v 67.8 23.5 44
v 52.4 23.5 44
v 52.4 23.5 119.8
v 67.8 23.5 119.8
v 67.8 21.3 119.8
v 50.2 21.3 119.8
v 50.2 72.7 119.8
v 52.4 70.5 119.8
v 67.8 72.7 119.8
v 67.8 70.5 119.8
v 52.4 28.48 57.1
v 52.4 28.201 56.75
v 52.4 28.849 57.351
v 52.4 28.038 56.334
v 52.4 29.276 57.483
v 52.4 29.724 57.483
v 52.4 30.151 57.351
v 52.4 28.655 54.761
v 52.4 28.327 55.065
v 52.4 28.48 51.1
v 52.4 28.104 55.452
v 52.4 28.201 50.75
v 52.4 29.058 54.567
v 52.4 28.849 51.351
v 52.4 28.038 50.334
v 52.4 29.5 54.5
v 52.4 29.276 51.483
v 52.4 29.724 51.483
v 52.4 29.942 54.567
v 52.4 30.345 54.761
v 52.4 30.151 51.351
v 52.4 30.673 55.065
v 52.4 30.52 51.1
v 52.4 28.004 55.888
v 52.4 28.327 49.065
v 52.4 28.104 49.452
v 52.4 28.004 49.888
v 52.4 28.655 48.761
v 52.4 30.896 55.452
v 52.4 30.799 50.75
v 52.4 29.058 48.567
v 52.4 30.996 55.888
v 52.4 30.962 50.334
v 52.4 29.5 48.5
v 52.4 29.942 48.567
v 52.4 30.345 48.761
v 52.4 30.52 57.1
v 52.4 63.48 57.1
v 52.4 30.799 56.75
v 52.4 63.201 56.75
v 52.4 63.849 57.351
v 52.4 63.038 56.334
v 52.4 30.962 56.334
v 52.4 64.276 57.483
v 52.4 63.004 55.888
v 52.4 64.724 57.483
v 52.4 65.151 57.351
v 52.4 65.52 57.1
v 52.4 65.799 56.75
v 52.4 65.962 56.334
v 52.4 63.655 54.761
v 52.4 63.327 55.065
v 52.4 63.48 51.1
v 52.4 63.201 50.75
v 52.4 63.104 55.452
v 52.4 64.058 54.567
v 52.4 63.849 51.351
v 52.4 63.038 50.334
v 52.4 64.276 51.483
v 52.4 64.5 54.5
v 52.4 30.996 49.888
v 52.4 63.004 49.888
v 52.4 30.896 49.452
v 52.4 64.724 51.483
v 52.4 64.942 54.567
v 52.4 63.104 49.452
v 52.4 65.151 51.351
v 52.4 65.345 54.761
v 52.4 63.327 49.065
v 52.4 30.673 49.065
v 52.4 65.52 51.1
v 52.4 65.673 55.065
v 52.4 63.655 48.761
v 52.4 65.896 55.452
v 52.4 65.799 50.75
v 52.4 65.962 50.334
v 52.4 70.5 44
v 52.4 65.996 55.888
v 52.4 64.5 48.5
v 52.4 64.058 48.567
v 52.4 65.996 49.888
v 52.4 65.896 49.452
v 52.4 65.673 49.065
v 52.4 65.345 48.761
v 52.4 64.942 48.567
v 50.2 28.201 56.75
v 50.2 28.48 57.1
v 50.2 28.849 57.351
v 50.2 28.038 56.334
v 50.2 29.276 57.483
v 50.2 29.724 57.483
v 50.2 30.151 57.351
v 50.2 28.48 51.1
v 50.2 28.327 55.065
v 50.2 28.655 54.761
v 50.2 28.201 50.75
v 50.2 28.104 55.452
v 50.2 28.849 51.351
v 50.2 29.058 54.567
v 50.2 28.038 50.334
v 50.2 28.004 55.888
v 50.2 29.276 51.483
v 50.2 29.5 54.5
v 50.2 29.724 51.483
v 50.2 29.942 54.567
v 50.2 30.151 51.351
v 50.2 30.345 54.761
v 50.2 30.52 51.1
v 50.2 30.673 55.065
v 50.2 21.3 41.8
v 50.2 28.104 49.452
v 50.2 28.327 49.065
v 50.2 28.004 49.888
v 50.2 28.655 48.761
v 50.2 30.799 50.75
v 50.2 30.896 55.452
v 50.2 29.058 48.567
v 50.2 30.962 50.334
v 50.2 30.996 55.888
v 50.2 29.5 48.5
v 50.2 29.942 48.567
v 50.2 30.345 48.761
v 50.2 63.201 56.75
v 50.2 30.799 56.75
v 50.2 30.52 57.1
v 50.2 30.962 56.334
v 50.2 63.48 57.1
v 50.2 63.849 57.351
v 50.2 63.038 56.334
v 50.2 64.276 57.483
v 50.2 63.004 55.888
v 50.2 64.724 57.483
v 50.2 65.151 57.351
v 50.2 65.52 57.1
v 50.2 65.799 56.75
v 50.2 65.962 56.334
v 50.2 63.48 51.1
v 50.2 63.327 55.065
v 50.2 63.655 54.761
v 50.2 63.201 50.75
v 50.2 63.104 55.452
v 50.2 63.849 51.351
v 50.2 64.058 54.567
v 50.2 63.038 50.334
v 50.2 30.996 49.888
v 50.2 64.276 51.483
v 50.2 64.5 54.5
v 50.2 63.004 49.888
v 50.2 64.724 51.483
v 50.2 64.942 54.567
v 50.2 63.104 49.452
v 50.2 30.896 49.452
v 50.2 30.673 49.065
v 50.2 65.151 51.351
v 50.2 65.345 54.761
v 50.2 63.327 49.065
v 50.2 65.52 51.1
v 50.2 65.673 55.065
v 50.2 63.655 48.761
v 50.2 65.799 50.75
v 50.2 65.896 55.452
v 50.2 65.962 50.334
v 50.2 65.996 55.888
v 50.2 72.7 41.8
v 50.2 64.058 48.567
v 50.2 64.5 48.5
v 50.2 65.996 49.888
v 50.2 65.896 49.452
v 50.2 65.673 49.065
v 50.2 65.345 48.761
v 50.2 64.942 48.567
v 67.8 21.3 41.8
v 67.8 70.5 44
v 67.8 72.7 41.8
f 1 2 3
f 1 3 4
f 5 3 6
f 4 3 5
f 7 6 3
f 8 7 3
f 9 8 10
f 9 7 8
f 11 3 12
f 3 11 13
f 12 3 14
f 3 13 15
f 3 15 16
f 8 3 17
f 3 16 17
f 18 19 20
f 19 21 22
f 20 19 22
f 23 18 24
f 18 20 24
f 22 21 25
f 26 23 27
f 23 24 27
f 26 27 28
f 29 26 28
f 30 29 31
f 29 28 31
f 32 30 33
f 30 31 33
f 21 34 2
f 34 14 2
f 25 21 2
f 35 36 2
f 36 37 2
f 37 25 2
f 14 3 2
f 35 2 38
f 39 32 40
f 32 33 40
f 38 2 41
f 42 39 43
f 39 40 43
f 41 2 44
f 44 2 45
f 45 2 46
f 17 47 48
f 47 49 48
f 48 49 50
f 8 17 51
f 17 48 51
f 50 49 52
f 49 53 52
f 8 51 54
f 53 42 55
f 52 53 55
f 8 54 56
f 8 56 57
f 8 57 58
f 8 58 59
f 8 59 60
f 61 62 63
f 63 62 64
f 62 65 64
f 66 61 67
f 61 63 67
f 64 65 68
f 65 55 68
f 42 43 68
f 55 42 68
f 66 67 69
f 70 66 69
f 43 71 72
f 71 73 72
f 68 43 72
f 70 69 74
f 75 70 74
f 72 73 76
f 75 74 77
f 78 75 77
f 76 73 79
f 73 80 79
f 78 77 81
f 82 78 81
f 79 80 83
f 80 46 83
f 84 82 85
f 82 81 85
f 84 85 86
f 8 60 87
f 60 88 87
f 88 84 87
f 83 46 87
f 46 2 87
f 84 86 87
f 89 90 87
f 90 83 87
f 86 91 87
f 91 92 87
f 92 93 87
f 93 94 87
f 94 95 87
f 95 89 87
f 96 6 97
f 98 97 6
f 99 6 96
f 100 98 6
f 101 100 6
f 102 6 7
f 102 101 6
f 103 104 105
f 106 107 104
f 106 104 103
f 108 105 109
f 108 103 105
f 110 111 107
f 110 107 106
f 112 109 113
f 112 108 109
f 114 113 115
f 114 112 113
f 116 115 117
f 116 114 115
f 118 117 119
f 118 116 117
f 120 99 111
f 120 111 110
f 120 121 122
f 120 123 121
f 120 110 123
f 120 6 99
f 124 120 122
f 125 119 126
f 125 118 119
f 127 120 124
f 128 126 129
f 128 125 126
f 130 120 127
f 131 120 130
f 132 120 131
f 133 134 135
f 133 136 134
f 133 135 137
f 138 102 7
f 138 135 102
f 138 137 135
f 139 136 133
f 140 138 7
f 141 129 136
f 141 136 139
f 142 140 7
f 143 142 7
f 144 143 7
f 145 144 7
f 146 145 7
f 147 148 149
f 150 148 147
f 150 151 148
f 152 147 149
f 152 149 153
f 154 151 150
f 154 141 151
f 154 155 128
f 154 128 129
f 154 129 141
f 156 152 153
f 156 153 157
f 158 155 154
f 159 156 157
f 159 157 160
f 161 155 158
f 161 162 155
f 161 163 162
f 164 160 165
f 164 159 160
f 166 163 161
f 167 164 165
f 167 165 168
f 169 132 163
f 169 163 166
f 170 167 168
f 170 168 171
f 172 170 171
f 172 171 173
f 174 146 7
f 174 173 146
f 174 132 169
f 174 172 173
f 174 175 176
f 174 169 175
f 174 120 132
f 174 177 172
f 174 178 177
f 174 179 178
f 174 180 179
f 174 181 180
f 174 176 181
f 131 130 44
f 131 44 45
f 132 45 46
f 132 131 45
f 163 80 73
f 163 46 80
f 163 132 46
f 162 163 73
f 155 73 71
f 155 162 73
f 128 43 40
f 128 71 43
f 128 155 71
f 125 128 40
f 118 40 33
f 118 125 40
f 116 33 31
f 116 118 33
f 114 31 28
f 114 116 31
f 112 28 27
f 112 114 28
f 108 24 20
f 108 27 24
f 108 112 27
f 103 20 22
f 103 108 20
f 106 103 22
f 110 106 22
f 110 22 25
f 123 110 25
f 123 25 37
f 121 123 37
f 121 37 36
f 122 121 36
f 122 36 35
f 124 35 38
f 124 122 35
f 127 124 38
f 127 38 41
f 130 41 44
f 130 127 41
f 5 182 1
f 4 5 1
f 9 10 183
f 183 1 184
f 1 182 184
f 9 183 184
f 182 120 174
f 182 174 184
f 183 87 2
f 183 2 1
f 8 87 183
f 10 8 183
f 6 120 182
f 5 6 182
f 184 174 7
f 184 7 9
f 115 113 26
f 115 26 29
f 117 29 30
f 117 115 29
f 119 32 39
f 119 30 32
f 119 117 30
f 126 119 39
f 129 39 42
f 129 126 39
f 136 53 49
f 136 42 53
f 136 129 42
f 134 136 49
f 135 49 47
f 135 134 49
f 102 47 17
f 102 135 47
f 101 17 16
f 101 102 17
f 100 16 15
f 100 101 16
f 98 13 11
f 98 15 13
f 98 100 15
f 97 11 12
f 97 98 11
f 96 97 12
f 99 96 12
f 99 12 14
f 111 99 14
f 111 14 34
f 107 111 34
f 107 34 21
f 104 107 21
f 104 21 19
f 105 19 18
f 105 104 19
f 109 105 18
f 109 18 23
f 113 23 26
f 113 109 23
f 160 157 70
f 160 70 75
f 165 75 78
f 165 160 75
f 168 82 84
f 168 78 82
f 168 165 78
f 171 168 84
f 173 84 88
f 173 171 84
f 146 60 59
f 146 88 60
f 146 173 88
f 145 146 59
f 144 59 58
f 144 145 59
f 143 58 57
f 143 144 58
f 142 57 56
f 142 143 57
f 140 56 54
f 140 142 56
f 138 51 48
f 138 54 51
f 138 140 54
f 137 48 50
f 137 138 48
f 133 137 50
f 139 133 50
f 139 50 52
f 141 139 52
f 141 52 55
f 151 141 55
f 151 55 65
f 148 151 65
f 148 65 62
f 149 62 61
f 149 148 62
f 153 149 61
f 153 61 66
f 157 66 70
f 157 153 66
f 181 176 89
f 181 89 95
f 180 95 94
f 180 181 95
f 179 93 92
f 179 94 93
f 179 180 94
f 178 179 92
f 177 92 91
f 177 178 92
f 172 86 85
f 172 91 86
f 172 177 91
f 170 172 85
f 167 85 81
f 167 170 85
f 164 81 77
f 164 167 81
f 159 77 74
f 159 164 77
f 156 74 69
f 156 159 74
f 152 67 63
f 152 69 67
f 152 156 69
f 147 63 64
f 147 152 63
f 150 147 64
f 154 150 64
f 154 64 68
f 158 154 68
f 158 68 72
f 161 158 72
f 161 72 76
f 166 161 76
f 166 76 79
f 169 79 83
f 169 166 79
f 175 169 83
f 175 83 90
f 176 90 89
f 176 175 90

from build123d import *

# Parameters (mm, degrees)
CYLINDER026_R     = 1.5
CYLINDER026_DEPTH = 10
CYLINDER025_R     = 1.5
CYLINDER025_DEPTH = 10
CYLINDER024_R     = 1.5
CYLINDER024_DEPTH = 10
CYLINDER027_R     = 1.5
CYLINDER027_DEPTH = 10
BOX022_W          = 15.4
BOX022_H          = 47
BOX022_DEPTH      = 75.8
BOX021_W          = 17.6
BOX021_H          = 51.4
BOX021_DEPTH      = 78


with BuildPart() as vs_schale_loch003:
    # Cylinder026 → Cylinder026 (new body)
    with BuildSketch(Plane(origin=(50, 64.5, 56), x_dir=(0, 0, -1), z_dir=(1, 0, 0))):
        Circle(CYLINDER026_R)
    extrude(amount=CYLINDER026_DEPTH)


with BuildPart() as vs_schale_loch002:
    # Cylinder025 → Cylinder025 (new body)
    with BuildSketch(Plane(origin=(50, 29.5, 50), x_dir=(0, 0, -1), z_dir=(1, 0, 0))):
        Circle(CYLINDER025_R)
    extrude(amount=CYLINDER025_DEPTH)


with BuildPart() as vs_schale_loch001:
    # Cylinder024 → Cylinder024 (new body)
    with BuildSketch(Plane(origin=(50, 29.5, 56), x_dir=(0, 0, -1), z_dir=(1, 0, 0))):
        Circle(CYLINDER024_R)
    extrude(amount=CYLINDER024_DEPTH)


with BuildPart() as vs_schale_loecher:
    # Cylinder027 → Cylinder027 (new body)
    with BuildSketch(Plane(origin=(50, 64.5, 50), x_dir=(0, 0, -1), z_dir=(1, 0, 0))):
        Circle(CYLINDER027_R)
    extrude(amount=CYLINDER027_DEPTH)

    # Fusion015: union VS_Schale_Loch003, VS_Schale_Loch002, VS_Schale_Loch001
    add(vs_schale_loch003.part)
    add(vs_schale_loch002.part)
    add(vs_schale_loch001.part)


with BuildPart() as verst_schale_innen:
    # Box022 → Box022 (new body)
    with BuildSketch(Plane(origin=(2.2, 2.2, 2.2), x_dir=(1, 0, 0), z_dir=(0, 0, 1))):
        with Locations((7.7, 23.5)):
            Rectangle(BOX022_W, BOX022_H)
    extrude(amount=BOX022_DEPTH)


with BuildPart() as verst_schale_loecher:
    # Box021 → Box021 (new body)
    with BuildSketch(Plane.XY):
        with Locations((8.8, 25.7)):
            Rectangle(BOX021_W, BOX021_H)
    extrude(amount=BOX021_DEPTH)

    # Cut022: cut Verst_Schale_Innen
    add(verst_schale_innen.part, mode=Mode.SUBTRACT)


with BuildPart() as verst_schale_loecher_1:
    # Cut022 placement: moved
    add(verst_schale_loecher.part.moved(Location((50.2, 21.3, 41.8))))

    # Cut029: cut VS_Schale_Loecher
    add(vs_schale_loecher.part, mode=Mode.SUBTRACT)


solid = verst_schale_loecher_1.part
